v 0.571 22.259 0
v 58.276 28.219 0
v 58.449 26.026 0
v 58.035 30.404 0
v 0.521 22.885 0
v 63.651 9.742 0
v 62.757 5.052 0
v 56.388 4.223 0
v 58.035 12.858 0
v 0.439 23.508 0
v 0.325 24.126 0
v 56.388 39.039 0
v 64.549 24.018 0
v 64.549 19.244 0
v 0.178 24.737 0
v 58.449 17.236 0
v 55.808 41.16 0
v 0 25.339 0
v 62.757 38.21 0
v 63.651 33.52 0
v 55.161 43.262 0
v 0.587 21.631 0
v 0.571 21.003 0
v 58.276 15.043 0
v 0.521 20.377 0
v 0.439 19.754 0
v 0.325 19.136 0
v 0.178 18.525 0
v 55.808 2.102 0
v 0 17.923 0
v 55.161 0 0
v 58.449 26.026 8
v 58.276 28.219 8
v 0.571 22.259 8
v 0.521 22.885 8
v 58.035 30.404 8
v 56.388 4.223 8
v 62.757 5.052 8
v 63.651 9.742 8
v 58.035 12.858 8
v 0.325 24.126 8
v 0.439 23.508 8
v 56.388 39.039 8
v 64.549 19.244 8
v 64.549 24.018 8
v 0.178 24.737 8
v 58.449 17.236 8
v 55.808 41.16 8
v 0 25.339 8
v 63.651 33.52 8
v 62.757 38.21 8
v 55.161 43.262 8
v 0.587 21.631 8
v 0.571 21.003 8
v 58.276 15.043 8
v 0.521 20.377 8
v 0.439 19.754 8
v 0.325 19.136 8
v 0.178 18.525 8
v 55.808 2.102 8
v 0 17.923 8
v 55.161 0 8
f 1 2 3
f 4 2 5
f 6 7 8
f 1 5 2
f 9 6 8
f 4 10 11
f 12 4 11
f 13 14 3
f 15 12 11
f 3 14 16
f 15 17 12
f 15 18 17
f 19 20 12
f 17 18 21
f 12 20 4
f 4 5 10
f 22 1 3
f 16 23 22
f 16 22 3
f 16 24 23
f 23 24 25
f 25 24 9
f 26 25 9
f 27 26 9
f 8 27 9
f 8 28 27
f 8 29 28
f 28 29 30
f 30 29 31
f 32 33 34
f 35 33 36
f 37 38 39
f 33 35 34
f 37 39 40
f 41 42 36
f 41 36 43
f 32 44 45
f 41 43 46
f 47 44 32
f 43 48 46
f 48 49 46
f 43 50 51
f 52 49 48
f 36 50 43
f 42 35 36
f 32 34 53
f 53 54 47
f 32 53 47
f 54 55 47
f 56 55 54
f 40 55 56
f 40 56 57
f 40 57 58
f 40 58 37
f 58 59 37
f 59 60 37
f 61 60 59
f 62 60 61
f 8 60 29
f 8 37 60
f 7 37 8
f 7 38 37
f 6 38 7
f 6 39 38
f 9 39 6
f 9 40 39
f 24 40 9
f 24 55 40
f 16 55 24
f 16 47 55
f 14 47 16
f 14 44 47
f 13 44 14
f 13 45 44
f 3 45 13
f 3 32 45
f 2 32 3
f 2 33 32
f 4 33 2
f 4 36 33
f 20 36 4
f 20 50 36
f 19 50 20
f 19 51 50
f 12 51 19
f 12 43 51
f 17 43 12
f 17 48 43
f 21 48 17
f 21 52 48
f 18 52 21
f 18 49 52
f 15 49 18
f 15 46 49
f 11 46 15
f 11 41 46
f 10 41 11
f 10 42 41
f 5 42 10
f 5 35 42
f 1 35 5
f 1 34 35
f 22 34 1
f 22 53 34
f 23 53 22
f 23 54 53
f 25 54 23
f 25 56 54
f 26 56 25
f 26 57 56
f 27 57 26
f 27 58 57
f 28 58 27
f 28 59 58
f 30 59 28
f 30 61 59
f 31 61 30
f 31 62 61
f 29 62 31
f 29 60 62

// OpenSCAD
$fn = 32;

// ----------------------------------------------------------------------
// Gear sector: 3 teeth on 36 degrees
// ----------------------------------------------------------------------

// --- parameters (mm) ---
sector_angle = 36;        // sector angle, degrees
root_r = 70;              // root circle radius
tooth_h = 6;              // tooth height over the root circle
teeth = 3;                // number of teeth on the sector
hub_r = 12;               // hub bore radius
plate_t = 8;              // sector thickness, Z
arc_step = 3;             // sampling step of the root/hub arcs, degrees

tip_r = root_r + tooth_h;  // tip circle radius

profile = [[55.161, 0], [55.808, 2.102], [56.388, 4.223], [62.757, 5.052], [63.651, 9.742], [58.035, 12.858], [58.276, 15.043], [58.449, 17.236], [64.549, 19.244], [64.549, 24.018], [58.449, 26.026], [58.276, 28.219], [58.035, 30.404], [63.651, 33.52], [62.757, 38.21], [56.388, 39.039], [55.808, 41.16], [55.161, 43.262], [0, 25.339], [0.178, 24.737], [0.325, 24.126], [0.439, 23.508], [0.521, 22.885], [0.571, 22.259], [0.587, 21.631], [0.571, 21.003], [0.521, 20.377], [0.439, 19.754], [0.325, 19.136], [0.178, 18.525], [0, 17.923]];  // primary outline, 31 points, counter clockwise

// --- the one profile operation ---
linear_extrude(height = plate_t) polygon(points = profile);
